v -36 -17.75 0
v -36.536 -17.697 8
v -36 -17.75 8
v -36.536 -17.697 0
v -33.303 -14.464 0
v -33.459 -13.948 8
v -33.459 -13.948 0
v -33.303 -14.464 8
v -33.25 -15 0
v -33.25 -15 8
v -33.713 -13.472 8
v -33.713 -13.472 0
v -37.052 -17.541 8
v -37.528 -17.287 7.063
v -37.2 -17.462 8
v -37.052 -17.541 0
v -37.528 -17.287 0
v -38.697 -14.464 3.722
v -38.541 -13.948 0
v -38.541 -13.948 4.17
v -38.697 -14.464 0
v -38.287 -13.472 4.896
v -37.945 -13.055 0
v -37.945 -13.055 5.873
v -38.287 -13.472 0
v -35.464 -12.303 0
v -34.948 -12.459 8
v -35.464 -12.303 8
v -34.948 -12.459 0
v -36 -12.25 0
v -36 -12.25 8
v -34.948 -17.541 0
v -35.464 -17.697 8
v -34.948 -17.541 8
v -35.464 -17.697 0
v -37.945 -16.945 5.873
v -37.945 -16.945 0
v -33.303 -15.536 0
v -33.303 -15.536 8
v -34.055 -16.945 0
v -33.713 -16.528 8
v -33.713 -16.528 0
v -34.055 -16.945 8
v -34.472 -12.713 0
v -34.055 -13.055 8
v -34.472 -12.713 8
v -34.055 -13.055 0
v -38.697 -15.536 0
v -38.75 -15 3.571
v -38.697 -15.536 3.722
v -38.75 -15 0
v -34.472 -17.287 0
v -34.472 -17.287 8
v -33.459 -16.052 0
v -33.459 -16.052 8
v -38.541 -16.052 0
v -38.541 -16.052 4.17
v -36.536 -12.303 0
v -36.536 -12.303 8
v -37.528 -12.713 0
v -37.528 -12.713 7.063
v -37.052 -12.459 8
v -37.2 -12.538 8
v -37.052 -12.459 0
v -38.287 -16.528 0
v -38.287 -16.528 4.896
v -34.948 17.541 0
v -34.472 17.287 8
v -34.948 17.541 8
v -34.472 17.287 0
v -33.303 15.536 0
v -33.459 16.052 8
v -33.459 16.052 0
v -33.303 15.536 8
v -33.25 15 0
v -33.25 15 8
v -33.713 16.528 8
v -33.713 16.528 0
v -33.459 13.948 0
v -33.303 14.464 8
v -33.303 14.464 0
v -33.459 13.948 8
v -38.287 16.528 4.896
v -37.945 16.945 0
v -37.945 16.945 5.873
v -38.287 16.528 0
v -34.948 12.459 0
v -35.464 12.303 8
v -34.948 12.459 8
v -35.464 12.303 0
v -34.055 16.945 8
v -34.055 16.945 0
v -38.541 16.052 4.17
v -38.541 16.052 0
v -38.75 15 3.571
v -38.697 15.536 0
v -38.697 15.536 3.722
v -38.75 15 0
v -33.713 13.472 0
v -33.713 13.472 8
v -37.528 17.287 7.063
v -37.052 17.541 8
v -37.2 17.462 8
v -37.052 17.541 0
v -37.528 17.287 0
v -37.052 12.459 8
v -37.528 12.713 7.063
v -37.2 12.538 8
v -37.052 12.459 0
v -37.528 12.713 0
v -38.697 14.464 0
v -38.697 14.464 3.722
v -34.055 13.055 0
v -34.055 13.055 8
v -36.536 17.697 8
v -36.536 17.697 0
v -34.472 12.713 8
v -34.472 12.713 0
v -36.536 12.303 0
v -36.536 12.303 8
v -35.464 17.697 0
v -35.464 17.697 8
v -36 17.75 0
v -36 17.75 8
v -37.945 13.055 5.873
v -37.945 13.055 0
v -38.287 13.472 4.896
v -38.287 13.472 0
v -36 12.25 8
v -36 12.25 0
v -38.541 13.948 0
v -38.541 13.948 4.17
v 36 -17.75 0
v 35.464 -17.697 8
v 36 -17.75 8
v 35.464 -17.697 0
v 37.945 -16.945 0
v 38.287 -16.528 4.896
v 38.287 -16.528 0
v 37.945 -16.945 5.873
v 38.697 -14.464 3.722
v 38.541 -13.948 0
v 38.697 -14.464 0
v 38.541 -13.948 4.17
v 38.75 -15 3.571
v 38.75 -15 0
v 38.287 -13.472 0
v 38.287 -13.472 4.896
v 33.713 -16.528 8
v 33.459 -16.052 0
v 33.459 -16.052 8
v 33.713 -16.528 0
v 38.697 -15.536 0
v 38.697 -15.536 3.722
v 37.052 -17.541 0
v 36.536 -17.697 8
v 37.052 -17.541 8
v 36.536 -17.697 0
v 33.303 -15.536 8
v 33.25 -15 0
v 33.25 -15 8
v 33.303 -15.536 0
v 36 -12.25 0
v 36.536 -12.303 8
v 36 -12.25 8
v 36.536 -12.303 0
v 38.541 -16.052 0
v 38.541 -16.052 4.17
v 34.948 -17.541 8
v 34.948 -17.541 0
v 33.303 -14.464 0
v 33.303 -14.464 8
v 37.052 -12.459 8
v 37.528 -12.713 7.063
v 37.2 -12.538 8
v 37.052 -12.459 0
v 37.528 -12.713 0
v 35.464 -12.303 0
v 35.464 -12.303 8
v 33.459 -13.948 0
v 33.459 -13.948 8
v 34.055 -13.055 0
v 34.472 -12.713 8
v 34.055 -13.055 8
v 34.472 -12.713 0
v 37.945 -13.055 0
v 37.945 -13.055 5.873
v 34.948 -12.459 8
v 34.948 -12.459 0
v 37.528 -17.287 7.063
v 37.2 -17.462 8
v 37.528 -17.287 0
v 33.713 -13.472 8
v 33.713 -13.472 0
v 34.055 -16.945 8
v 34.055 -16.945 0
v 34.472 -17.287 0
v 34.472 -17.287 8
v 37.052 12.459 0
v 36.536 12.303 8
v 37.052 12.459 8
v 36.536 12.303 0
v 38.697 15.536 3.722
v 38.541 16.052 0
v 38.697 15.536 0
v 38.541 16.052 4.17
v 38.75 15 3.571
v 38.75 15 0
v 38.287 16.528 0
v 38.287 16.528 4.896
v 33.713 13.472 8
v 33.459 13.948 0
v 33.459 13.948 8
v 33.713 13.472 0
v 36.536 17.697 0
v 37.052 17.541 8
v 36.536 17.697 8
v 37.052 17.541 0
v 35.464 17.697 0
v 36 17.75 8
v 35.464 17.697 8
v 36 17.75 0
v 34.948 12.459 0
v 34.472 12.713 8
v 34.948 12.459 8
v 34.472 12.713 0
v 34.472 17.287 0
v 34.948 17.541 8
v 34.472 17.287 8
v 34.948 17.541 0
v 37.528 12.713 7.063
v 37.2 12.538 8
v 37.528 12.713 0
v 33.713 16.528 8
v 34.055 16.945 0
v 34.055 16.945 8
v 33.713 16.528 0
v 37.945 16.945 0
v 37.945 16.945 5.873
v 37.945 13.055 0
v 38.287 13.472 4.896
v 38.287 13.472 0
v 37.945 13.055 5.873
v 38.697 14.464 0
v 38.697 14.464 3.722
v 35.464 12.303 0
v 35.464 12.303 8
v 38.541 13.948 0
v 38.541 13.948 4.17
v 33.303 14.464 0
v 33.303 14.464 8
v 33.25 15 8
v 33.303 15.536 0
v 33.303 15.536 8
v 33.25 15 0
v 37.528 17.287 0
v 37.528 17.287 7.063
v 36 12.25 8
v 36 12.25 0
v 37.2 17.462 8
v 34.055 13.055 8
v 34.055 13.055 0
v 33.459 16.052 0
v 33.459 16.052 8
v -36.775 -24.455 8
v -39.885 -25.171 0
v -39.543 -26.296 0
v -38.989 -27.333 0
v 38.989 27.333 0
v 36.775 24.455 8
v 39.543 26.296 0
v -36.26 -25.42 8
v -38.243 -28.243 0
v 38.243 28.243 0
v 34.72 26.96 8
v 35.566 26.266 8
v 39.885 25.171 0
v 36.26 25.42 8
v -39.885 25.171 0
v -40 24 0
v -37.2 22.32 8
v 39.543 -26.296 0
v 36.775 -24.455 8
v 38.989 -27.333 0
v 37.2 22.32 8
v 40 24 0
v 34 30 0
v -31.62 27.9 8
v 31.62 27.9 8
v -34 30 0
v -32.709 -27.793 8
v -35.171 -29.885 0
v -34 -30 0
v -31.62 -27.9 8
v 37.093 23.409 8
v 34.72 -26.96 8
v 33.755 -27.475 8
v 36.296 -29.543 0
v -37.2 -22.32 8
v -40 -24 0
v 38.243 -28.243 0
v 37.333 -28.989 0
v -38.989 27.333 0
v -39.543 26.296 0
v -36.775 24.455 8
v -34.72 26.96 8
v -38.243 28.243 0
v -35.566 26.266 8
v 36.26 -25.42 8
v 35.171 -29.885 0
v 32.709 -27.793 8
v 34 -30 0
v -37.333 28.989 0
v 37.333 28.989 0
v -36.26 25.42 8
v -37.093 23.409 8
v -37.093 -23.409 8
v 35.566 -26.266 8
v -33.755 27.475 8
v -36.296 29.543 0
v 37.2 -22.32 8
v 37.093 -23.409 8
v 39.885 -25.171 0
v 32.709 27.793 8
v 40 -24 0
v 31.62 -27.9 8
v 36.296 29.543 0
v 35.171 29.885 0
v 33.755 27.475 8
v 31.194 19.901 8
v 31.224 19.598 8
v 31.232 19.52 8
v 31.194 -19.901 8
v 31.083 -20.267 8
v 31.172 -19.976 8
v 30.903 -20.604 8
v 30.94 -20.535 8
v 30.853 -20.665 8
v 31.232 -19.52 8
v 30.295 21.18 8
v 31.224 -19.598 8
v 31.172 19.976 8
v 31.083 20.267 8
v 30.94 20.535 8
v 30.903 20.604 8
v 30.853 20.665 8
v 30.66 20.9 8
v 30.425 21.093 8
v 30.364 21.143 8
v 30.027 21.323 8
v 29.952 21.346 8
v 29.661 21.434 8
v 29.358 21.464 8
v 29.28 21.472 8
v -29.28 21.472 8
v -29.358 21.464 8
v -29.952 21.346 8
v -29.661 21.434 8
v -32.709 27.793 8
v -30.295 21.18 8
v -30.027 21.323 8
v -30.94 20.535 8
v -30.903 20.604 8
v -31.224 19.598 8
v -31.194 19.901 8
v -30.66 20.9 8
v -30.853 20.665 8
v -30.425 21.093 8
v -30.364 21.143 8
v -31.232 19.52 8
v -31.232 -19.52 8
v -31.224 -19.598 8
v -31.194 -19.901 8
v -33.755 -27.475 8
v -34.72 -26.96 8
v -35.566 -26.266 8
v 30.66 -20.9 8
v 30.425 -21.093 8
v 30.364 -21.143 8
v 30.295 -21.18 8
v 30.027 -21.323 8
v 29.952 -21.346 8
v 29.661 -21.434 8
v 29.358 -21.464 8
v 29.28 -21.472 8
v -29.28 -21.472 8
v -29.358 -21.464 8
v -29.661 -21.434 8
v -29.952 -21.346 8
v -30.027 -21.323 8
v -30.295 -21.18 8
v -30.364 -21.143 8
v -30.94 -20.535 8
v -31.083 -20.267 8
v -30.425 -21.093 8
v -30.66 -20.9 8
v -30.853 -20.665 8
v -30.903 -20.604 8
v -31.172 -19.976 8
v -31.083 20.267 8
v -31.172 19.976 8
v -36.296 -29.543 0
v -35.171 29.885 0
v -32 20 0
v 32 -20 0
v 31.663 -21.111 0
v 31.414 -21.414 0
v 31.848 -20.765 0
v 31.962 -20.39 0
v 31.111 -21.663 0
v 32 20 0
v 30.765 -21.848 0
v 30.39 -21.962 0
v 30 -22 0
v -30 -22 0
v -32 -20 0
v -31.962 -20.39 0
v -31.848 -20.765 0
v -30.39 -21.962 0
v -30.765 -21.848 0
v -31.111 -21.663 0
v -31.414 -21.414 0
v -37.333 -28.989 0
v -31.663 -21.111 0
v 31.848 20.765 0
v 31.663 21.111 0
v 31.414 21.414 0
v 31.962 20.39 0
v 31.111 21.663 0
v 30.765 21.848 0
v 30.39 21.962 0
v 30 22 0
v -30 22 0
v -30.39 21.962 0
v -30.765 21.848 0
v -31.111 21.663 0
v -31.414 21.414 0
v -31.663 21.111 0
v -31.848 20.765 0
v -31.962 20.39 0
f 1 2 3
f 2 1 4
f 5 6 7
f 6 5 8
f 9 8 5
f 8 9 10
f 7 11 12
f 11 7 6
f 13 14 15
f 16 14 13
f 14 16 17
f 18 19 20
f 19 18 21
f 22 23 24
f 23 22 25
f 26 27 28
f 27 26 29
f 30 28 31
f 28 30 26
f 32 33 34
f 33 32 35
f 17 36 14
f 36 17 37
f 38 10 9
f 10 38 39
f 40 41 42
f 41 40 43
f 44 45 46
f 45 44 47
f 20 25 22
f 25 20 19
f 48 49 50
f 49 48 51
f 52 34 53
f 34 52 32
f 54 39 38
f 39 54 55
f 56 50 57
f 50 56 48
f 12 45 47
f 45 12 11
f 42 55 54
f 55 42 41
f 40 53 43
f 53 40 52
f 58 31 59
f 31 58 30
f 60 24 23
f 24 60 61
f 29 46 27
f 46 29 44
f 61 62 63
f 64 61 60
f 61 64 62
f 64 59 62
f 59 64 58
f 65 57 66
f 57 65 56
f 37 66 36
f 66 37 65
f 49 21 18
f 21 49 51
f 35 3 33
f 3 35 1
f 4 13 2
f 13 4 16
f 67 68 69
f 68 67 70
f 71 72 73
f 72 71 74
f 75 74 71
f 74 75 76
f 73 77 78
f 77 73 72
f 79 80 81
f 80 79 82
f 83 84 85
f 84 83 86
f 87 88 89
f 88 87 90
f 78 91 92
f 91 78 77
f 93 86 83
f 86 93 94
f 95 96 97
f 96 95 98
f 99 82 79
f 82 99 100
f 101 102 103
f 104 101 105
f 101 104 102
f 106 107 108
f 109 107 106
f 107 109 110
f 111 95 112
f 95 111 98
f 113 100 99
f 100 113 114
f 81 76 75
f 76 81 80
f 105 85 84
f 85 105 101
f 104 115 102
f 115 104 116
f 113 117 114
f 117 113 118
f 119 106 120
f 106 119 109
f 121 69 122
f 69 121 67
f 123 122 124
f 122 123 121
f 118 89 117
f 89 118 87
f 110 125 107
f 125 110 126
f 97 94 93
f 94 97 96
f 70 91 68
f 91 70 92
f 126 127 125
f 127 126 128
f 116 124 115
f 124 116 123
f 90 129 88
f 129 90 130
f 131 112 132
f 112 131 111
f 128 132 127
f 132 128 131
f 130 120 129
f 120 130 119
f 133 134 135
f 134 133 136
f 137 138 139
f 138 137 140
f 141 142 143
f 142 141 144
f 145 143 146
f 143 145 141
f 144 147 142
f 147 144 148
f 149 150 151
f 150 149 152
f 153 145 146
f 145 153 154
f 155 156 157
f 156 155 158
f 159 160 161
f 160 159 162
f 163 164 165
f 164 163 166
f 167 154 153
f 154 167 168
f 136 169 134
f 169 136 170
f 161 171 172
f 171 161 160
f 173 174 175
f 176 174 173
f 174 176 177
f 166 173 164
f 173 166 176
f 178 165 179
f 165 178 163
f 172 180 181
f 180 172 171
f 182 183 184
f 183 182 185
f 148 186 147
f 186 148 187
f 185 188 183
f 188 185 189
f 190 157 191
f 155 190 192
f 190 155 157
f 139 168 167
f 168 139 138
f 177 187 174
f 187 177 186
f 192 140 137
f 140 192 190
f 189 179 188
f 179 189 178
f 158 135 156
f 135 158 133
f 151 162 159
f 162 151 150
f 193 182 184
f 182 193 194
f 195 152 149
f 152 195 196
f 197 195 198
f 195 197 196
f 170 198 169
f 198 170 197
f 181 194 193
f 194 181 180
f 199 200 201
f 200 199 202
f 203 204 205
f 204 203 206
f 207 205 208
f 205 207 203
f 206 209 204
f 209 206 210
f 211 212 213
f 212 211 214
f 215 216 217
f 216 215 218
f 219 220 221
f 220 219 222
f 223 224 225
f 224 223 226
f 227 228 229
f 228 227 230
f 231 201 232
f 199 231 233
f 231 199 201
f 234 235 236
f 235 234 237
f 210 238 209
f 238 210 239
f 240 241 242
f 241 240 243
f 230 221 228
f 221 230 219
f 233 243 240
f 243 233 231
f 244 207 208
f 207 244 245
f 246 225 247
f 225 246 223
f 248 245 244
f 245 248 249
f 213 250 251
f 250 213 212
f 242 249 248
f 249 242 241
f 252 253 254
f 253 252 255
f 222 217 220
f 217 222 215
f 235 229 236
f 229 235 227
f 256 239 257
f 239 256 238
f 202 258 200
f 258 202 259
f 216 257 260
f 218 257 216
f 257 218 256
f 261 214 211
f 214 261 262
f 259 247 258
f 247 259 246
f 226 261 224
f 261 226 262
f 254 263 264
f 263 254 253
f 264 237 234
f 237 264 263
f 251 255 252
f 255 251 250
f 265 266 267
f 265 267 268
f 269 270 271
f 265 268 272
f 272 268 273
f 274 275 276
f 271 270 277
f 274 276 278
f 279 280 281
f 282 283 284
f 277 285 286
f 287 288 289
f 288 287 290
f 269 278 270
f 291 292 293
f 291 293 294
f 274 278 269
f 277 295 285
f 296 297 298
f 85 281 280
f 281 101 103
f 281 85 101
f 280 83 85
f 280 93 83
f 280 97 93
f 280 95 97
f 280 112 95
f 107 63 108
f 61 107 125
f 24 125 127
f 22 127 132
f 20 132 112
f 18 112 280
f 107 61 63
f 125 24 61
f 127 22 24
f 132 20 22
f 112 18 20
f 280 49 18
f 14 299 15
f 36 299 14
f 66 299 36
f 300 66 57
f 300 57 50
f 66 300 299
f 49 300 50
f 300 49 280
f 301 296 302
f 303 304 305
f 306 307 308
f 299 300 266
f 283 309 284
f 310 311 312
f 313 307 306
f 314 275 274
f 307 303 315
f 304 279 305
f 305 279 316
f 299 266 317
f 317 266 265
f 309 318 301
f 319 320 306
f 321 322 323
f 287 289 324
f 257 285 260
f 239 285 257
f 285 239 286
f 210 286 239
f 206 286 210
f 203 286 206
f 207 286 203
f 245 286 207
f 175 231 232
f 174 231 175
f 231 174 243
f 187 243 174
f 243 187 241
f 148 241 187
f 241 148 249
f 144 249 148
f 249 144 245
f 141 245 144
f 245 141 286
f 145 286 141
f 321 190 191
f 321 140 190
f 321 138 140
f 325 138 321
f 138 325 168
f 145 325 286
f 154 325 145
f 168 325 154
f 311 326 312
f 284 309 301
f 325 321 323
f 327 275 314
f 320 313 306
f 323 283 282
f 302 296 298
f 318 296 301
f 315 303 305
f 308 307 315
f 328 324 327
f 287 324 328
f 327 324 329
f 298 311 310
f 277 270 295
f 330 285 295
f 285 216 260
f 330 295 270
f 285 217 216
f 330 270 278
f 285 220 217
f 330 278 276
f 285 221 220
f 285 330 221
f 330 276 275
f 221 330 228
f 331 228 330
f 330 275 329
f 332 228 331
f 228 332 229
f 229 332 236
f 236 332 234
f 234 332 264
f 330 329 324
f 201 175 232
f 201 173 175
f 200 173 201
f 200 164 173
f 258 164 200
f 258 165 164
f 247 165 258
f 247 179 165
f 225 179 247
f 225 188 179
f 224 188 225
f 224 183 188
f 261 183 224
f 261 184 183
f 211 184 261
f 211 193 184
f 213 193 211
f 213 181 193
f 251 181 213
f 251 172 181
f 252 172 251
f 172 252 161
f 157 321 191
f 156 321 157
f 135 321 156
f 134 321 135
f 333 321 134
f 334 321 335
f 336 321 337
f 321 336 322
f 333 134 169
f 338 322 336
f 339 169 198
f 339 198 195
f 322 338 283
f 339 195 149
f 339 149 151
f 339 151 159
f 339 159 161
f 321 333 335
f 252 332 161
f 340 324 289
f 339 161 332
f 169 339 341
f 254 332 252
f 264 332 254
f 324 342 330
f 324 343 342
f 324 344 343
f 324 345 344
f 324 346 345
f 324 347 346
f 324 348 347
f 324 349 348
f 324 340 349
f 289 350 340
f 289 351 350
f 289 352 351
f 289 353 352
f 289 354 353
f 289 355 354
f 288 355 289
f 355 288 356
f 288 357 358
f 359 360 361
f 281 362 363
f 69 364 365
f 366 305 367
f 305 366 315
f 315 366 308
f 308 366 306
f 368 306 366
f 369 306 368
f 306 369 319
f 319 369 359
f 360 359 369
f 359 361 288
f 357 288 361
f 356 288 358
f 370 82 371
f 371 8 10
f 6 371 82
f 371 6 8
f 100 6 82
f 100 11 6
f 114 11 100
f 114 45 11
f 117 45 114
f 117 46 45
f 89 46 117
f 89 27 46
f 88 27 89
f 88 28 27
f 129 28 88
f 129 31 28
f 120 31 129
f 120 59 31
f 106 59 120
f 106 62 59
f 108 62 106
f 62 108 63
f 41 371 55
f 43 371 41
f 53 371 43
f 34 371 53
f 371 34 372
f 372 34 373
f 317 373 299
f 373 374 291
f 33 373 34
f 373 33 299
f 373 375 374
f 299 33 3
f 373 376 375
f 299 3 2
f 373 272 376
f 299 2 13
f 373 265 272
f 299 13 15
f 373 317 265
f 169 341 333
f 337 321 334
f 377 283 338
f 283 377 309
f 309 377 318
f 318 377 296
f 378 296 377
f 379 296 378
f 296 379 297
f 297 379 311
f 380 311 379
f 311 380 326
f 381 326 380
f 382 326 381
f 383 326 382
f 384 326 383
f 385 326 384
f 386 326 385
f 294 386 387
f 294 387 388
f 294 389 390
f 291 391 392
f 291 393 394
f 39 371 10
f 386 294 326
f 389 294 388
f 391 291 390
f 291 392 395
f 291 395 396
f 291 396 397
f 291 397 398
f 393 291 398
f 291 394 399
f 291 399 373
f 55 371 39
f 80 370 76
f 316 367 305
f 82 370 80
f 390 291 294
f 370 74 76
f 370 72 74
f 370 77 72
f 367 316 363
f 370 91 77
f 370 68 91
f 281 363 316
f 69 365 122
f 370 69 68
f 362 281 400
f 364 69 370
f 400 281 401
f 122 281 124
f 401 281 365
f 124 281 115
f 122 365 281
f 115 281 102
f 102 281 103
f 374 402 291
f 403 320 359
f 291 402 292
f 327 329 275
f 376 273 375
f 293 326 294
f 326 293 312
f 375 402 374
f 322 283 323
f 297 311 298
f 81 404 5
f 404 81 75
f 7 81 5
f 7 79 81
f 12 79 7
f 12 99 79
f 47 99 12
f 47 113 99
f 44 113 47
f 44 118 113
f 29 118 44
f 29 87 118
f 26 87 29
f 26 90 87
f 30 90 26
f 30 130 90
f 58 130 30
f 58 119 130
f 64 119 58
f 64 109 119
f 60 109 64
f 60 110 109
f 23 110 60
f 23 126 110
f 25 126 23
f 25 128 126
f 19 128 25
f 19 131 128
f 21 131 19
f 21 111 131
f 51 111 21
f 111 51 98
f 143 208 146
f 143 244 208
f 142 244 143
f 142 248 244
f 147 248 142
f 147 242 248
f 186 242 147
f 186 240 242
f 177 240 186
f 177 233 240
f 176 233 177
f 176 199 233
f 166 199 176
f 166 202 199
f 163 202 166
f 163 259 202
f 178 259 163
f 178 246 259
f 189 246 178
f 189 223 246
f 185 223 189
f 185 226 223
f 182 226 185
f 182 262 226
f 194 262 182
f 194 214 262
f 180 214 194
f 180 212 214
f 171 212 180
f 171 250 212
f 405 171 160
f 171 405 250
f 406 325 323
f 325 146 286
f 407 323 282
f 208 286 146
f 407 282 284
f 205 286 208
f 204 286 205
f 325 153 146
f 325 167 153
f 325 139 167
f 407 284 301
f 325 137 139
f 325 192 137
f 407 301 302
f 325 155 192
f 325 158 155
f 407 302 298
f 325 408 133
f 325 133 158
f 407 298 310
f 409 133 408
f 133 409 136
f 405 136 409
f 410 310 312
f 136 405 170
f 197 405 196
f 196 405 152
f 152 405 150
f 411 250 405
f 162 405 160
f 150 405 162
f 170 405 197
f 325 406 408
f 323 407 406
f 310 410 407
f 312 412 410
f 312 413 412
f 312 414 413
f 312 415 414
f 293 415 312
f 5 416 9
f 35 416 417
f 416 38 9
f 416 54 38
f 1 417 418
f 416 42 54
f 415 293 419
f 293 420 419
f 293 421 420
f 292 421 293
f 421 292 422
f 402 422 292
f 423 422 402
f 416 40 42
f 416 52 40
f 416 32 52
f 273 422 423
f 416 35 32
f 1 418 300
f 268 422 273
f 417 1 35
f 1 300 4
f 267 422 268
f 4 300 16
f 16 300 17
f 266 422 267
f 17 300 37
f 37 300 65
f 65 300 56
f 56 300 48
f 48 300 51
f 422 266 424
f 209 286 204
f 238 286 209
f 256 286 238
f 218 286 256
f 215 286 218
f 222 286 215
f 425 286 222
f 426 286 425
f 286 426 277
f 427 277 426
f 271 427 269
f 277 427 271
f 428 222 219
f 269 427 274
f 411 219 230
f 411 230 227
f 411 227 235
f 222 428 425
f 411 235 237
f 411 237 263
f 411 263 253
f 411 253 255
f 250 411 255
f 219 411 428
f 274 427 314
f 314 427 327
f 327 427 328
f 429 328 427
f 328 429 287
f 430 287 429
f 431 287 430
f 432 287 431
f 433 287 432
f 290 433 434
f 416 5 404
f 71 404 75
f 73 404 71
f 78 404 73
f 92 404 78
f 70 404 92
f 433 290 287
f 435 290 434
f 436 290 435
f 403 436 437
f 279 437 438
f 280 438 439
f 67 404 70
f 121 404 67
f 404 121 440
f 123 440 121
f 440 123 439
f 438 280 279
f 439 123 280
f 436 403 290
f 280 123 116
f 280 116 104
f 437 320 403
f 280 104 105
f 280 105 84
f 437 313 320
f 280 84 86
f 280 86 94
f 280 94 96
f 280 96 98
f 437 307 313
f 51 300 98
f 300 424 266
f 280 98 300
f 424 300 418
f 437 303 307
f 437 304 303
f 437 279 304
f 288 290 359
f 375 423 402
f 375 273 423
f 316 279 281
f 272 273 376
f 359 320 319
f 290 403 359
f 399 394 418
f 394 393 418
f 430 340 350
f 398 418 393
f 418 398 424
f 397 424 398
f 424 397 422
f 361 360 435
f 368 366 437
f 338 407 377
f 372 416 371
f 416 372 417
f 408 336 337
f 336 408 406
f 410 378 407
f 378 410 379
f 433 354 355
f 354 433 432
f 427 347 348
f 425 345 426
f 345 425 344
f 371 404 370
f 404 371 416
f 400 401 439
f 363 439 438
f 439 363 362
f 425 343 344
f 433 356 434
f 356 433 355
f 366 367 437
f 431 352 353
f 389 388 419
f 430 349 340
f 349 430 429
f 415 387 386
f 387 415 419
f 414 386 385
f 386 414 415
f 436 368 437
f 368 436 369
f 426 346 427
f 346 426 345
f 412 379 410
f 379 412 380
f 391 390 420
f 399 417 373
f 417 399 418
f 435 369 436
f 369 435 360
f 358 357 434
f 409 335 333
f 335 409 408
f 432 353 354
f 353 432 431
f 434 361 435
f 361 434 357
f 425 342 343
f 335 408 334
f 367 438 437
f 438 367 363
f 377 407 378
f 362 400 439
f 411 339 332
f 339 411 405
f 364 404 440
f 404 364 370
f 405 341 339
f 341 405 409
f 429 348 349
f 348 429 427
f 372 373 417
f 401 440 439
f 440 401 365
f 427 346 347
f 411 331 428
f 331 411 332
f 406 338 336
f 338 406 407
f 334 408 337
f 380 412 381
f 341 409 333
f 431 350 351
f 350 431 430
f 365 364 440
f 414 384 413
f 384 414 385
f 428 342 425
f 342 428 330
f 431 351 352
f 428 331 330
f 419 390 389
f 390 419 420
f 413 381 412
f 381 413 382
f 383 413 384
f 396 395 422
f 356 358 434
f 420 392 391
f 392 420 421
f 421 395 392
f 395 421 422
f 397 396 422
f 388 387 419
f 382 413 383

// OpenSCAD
$fn = 32;

// ----------------------------------------------------------------------
// Display bezel: 80 x 60 mm frame, opening 64x44 mm
// ----------------------------------------------------------------------

// --- parameters (mm) ---
length = 80;              // frame outside length, X
width = 60;               // frame outside width, Y
frame_w = 8;              // frame width
thickness = 8;            // frame thickness
corner_r = 6;             // outside corner radius
chamfer = 0.93;           // outer wall taper
funnel = 0.97;            // inner opening taper
opening_l = 64;           // opening length
opening_w = 44;           // opening width
inner_r = 2;              // opening corner radius
hole_d = 5.5;             // mounting screw clearance
holes_per_side = 2;       // holes per short side
hole_inset = 4;           // hole centre inset from the outside edge

/* rounded-rectangle outlines, generated with loops */
module rounded_ring(l_nom, w_nom, r) {
  hull() {
    for (sx = [-1, 1]) for (sy = [-1, 1])
      translate([sx * (l_nom / 2 - r), sy * (w_nom / 2 - r)]) circle(r = r);
  }
}

difference() {
  /* frame body, drafted so the outer edge is a variable-depth chamfer */
  linear_extrude(height = thickness, scale = chamfer)
    rounded_ring(length, width, corner_r);
  /* viewing opening, drafted the other way for a funnel edge */
  linear_extrude(height = thickness + 2, scale = funnel)
    translate([0, 0, -1]) rounded_ring(opening_l, opening_w, inner_r);
  /* mounting screws through the frame lands */
  for (sx = [-1, 1]) for (i = [1 : holes_per_side])
    translate([sx * (length / 2 - hole_inset),
               (i - (holes_per_side + 1) / 2) * width * 0.5, -1])
      cylinder(h = thickness + 2, d = hole_d);
}
